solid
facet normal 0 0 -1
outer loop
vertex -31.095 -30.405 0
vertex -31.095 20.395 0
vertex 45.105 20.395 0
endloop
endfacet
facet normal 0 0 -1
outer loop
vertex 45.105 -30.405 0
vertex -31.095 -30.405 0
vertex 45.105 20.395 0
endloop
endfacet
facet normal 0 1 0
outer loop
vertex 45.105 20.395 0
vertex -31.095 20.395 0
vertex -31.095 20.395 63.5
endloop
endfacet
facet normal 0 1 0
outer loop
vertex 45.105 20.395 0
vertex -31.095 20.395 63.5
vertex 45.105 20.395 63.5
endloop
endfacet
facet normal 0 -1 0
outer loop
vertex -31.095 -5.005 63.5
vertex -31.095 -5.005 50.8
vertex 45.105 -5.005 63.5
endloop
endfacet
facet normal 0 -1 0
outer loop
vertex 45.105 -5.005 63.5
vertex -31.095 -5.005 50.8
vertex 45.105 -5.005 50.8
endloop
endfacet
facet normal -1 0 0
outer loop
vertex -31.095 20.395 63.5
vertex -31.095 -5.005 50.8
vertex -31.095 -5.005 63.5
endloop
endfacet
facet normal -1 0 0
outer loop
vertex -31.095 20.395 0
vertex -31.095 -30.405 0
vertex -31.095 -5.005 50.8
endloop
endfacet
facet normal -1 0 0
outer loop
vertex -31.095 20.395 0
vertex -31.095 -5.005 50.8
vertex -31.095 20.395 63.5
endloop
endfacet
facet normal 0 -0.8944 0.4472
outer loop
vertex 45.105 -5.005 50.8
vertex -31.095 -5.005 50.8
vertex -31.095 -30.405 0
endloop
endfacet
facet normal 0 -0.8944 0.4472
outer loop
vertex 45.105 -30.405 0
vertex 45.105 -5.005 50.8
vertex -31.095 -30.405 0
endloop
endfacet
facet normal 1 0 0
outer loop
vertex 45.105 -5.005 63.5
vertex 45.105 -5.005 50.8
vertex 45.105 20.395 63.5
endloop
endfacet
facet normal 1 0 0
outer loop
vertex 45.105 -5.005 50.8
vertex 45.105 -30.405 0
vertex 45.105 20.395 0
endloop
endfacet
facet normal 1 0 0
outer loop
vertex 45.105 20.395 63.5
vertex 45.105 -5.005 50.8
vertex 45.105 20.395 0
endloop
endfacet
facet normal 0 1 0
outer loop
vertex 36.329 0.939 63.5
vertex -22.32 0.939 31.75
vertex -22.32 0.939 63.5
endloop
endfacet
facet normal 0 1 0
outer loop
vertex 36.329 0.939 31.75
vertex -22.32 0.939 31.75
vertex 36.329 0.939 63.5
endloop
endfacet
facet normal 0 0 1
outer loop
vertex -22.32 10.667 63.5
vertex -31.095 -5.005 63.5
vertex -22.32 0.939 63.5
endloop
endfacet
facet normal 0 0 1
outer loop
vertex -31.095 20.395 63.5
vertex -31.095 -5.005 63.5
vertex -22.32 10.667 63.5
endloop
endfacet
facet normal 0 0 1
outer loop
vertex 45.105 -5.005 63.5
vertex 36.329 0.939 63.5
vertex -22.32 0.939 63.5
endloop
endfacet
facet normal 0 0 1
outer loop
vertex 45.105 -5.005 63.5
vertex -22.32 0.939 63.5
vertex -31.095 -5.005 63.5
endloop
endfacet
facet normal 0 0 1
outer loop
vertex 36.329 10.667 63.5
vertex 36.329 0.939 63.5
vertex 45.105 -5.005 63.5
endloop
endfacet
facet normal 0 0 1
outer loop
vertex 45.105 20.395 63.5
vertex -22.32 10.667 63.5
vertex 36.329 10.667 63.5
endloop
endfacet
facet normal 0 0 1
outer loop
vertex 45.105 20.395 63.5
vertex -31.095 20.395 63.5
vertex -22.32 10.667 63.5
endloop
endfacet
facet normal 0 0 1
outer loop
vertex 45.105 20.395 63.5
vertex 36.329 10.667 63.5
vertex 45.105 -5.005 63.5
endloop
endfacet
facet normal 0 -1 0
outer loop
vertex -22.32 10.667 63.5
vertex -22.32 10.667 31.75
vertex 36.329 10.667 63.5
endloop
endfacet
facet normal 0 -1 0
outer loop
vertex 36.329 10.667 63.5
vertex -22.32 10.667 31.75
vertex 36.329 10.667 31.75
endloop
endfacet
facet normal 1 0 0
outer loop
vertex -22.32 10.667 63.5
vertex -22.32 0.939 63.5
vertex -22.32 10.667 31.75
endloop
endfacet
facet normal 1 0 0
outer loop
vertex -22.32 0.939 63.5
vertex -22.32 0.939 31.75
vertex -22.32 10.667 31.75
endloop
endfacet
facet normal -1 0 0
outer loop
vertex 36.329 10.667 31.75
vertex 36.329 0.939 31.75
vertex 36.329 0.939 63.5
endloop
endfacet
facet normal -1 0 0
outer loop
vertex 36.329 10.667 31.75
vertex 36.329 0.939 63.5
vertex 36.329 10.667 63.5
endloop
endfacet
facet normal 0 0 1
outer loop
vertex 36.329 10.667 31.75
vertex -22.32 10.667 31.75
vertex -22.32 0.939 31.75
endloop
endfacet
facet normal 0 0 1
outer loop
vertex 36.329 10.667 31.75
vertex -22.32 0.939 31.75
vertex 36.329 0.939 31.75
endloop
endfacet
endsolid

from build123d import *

# Parameters (mm, degrees)
F0_W        = 76.2
F0_H        = 50.8
F1_DEPTH    = 50.8
F2_W        = 58.6486
F2_H        = 9.7282
F3_DEPTH    = 19.05
F5_DEPTH    = 76.2
F1_FACE_W   = 76.2
F1_FACE_H   = 25.4
F1_FACE_W_2 = 58.6486
F1_FACE_H_2 = 9.7282
F6_DEPTH    = 12.7


with BuildPart() as f1:
    # F0 (on Top) → F1 (new body)
    with BuildSketch(Plane.XY):
        with Locations((7.004574, -5.004832)):
            Rectangle(F0_W, F0_H)
    extrude(amount=F1_DEPTH)

    # F2 (on face) → F3 (cut)
    with BuildSketch(Plane.XY.offset(50.8)):
        with Locations((7.004574, 5.802868)):
            Rectangle(F2_W, F2_H)
    extrude(amount=-F3_DEPTH, mode=Mode.SUBTRACT)

    # F4 (on face) → F5 (cut)
    with BuildSketch(Plane(origin=(-31.095426, 0, 0), x_dir=(0, -1, 0), z_dir=(-1, 0, 0))):
        Polygon((30.404832, 50.8), (5.004832, 50.8), (30.404832, 0), align=None)
    extrude(amount=-F5_DEPTH, mode=Mode.SUBTRACT)

    # F1_face (on face) → F6 (join)
    with BuildSketch(Plane(origin=(7.004574, -5.004832, 50.8), x_dir=(1, 0, 0), z_dir=(0, 0, 1))):
        with Locations((0, 12.7)):
            Rectangle(F1_FACE_W, F1_FACE_H)
        with Locations((0, 10.8077)):
            Rectangle(F1_FACE_W_2, F1_FACE_H_2, mode=Mode.SUBTRACT)
    extrude(amount=F6_DEPTH)


solid = f1.part
